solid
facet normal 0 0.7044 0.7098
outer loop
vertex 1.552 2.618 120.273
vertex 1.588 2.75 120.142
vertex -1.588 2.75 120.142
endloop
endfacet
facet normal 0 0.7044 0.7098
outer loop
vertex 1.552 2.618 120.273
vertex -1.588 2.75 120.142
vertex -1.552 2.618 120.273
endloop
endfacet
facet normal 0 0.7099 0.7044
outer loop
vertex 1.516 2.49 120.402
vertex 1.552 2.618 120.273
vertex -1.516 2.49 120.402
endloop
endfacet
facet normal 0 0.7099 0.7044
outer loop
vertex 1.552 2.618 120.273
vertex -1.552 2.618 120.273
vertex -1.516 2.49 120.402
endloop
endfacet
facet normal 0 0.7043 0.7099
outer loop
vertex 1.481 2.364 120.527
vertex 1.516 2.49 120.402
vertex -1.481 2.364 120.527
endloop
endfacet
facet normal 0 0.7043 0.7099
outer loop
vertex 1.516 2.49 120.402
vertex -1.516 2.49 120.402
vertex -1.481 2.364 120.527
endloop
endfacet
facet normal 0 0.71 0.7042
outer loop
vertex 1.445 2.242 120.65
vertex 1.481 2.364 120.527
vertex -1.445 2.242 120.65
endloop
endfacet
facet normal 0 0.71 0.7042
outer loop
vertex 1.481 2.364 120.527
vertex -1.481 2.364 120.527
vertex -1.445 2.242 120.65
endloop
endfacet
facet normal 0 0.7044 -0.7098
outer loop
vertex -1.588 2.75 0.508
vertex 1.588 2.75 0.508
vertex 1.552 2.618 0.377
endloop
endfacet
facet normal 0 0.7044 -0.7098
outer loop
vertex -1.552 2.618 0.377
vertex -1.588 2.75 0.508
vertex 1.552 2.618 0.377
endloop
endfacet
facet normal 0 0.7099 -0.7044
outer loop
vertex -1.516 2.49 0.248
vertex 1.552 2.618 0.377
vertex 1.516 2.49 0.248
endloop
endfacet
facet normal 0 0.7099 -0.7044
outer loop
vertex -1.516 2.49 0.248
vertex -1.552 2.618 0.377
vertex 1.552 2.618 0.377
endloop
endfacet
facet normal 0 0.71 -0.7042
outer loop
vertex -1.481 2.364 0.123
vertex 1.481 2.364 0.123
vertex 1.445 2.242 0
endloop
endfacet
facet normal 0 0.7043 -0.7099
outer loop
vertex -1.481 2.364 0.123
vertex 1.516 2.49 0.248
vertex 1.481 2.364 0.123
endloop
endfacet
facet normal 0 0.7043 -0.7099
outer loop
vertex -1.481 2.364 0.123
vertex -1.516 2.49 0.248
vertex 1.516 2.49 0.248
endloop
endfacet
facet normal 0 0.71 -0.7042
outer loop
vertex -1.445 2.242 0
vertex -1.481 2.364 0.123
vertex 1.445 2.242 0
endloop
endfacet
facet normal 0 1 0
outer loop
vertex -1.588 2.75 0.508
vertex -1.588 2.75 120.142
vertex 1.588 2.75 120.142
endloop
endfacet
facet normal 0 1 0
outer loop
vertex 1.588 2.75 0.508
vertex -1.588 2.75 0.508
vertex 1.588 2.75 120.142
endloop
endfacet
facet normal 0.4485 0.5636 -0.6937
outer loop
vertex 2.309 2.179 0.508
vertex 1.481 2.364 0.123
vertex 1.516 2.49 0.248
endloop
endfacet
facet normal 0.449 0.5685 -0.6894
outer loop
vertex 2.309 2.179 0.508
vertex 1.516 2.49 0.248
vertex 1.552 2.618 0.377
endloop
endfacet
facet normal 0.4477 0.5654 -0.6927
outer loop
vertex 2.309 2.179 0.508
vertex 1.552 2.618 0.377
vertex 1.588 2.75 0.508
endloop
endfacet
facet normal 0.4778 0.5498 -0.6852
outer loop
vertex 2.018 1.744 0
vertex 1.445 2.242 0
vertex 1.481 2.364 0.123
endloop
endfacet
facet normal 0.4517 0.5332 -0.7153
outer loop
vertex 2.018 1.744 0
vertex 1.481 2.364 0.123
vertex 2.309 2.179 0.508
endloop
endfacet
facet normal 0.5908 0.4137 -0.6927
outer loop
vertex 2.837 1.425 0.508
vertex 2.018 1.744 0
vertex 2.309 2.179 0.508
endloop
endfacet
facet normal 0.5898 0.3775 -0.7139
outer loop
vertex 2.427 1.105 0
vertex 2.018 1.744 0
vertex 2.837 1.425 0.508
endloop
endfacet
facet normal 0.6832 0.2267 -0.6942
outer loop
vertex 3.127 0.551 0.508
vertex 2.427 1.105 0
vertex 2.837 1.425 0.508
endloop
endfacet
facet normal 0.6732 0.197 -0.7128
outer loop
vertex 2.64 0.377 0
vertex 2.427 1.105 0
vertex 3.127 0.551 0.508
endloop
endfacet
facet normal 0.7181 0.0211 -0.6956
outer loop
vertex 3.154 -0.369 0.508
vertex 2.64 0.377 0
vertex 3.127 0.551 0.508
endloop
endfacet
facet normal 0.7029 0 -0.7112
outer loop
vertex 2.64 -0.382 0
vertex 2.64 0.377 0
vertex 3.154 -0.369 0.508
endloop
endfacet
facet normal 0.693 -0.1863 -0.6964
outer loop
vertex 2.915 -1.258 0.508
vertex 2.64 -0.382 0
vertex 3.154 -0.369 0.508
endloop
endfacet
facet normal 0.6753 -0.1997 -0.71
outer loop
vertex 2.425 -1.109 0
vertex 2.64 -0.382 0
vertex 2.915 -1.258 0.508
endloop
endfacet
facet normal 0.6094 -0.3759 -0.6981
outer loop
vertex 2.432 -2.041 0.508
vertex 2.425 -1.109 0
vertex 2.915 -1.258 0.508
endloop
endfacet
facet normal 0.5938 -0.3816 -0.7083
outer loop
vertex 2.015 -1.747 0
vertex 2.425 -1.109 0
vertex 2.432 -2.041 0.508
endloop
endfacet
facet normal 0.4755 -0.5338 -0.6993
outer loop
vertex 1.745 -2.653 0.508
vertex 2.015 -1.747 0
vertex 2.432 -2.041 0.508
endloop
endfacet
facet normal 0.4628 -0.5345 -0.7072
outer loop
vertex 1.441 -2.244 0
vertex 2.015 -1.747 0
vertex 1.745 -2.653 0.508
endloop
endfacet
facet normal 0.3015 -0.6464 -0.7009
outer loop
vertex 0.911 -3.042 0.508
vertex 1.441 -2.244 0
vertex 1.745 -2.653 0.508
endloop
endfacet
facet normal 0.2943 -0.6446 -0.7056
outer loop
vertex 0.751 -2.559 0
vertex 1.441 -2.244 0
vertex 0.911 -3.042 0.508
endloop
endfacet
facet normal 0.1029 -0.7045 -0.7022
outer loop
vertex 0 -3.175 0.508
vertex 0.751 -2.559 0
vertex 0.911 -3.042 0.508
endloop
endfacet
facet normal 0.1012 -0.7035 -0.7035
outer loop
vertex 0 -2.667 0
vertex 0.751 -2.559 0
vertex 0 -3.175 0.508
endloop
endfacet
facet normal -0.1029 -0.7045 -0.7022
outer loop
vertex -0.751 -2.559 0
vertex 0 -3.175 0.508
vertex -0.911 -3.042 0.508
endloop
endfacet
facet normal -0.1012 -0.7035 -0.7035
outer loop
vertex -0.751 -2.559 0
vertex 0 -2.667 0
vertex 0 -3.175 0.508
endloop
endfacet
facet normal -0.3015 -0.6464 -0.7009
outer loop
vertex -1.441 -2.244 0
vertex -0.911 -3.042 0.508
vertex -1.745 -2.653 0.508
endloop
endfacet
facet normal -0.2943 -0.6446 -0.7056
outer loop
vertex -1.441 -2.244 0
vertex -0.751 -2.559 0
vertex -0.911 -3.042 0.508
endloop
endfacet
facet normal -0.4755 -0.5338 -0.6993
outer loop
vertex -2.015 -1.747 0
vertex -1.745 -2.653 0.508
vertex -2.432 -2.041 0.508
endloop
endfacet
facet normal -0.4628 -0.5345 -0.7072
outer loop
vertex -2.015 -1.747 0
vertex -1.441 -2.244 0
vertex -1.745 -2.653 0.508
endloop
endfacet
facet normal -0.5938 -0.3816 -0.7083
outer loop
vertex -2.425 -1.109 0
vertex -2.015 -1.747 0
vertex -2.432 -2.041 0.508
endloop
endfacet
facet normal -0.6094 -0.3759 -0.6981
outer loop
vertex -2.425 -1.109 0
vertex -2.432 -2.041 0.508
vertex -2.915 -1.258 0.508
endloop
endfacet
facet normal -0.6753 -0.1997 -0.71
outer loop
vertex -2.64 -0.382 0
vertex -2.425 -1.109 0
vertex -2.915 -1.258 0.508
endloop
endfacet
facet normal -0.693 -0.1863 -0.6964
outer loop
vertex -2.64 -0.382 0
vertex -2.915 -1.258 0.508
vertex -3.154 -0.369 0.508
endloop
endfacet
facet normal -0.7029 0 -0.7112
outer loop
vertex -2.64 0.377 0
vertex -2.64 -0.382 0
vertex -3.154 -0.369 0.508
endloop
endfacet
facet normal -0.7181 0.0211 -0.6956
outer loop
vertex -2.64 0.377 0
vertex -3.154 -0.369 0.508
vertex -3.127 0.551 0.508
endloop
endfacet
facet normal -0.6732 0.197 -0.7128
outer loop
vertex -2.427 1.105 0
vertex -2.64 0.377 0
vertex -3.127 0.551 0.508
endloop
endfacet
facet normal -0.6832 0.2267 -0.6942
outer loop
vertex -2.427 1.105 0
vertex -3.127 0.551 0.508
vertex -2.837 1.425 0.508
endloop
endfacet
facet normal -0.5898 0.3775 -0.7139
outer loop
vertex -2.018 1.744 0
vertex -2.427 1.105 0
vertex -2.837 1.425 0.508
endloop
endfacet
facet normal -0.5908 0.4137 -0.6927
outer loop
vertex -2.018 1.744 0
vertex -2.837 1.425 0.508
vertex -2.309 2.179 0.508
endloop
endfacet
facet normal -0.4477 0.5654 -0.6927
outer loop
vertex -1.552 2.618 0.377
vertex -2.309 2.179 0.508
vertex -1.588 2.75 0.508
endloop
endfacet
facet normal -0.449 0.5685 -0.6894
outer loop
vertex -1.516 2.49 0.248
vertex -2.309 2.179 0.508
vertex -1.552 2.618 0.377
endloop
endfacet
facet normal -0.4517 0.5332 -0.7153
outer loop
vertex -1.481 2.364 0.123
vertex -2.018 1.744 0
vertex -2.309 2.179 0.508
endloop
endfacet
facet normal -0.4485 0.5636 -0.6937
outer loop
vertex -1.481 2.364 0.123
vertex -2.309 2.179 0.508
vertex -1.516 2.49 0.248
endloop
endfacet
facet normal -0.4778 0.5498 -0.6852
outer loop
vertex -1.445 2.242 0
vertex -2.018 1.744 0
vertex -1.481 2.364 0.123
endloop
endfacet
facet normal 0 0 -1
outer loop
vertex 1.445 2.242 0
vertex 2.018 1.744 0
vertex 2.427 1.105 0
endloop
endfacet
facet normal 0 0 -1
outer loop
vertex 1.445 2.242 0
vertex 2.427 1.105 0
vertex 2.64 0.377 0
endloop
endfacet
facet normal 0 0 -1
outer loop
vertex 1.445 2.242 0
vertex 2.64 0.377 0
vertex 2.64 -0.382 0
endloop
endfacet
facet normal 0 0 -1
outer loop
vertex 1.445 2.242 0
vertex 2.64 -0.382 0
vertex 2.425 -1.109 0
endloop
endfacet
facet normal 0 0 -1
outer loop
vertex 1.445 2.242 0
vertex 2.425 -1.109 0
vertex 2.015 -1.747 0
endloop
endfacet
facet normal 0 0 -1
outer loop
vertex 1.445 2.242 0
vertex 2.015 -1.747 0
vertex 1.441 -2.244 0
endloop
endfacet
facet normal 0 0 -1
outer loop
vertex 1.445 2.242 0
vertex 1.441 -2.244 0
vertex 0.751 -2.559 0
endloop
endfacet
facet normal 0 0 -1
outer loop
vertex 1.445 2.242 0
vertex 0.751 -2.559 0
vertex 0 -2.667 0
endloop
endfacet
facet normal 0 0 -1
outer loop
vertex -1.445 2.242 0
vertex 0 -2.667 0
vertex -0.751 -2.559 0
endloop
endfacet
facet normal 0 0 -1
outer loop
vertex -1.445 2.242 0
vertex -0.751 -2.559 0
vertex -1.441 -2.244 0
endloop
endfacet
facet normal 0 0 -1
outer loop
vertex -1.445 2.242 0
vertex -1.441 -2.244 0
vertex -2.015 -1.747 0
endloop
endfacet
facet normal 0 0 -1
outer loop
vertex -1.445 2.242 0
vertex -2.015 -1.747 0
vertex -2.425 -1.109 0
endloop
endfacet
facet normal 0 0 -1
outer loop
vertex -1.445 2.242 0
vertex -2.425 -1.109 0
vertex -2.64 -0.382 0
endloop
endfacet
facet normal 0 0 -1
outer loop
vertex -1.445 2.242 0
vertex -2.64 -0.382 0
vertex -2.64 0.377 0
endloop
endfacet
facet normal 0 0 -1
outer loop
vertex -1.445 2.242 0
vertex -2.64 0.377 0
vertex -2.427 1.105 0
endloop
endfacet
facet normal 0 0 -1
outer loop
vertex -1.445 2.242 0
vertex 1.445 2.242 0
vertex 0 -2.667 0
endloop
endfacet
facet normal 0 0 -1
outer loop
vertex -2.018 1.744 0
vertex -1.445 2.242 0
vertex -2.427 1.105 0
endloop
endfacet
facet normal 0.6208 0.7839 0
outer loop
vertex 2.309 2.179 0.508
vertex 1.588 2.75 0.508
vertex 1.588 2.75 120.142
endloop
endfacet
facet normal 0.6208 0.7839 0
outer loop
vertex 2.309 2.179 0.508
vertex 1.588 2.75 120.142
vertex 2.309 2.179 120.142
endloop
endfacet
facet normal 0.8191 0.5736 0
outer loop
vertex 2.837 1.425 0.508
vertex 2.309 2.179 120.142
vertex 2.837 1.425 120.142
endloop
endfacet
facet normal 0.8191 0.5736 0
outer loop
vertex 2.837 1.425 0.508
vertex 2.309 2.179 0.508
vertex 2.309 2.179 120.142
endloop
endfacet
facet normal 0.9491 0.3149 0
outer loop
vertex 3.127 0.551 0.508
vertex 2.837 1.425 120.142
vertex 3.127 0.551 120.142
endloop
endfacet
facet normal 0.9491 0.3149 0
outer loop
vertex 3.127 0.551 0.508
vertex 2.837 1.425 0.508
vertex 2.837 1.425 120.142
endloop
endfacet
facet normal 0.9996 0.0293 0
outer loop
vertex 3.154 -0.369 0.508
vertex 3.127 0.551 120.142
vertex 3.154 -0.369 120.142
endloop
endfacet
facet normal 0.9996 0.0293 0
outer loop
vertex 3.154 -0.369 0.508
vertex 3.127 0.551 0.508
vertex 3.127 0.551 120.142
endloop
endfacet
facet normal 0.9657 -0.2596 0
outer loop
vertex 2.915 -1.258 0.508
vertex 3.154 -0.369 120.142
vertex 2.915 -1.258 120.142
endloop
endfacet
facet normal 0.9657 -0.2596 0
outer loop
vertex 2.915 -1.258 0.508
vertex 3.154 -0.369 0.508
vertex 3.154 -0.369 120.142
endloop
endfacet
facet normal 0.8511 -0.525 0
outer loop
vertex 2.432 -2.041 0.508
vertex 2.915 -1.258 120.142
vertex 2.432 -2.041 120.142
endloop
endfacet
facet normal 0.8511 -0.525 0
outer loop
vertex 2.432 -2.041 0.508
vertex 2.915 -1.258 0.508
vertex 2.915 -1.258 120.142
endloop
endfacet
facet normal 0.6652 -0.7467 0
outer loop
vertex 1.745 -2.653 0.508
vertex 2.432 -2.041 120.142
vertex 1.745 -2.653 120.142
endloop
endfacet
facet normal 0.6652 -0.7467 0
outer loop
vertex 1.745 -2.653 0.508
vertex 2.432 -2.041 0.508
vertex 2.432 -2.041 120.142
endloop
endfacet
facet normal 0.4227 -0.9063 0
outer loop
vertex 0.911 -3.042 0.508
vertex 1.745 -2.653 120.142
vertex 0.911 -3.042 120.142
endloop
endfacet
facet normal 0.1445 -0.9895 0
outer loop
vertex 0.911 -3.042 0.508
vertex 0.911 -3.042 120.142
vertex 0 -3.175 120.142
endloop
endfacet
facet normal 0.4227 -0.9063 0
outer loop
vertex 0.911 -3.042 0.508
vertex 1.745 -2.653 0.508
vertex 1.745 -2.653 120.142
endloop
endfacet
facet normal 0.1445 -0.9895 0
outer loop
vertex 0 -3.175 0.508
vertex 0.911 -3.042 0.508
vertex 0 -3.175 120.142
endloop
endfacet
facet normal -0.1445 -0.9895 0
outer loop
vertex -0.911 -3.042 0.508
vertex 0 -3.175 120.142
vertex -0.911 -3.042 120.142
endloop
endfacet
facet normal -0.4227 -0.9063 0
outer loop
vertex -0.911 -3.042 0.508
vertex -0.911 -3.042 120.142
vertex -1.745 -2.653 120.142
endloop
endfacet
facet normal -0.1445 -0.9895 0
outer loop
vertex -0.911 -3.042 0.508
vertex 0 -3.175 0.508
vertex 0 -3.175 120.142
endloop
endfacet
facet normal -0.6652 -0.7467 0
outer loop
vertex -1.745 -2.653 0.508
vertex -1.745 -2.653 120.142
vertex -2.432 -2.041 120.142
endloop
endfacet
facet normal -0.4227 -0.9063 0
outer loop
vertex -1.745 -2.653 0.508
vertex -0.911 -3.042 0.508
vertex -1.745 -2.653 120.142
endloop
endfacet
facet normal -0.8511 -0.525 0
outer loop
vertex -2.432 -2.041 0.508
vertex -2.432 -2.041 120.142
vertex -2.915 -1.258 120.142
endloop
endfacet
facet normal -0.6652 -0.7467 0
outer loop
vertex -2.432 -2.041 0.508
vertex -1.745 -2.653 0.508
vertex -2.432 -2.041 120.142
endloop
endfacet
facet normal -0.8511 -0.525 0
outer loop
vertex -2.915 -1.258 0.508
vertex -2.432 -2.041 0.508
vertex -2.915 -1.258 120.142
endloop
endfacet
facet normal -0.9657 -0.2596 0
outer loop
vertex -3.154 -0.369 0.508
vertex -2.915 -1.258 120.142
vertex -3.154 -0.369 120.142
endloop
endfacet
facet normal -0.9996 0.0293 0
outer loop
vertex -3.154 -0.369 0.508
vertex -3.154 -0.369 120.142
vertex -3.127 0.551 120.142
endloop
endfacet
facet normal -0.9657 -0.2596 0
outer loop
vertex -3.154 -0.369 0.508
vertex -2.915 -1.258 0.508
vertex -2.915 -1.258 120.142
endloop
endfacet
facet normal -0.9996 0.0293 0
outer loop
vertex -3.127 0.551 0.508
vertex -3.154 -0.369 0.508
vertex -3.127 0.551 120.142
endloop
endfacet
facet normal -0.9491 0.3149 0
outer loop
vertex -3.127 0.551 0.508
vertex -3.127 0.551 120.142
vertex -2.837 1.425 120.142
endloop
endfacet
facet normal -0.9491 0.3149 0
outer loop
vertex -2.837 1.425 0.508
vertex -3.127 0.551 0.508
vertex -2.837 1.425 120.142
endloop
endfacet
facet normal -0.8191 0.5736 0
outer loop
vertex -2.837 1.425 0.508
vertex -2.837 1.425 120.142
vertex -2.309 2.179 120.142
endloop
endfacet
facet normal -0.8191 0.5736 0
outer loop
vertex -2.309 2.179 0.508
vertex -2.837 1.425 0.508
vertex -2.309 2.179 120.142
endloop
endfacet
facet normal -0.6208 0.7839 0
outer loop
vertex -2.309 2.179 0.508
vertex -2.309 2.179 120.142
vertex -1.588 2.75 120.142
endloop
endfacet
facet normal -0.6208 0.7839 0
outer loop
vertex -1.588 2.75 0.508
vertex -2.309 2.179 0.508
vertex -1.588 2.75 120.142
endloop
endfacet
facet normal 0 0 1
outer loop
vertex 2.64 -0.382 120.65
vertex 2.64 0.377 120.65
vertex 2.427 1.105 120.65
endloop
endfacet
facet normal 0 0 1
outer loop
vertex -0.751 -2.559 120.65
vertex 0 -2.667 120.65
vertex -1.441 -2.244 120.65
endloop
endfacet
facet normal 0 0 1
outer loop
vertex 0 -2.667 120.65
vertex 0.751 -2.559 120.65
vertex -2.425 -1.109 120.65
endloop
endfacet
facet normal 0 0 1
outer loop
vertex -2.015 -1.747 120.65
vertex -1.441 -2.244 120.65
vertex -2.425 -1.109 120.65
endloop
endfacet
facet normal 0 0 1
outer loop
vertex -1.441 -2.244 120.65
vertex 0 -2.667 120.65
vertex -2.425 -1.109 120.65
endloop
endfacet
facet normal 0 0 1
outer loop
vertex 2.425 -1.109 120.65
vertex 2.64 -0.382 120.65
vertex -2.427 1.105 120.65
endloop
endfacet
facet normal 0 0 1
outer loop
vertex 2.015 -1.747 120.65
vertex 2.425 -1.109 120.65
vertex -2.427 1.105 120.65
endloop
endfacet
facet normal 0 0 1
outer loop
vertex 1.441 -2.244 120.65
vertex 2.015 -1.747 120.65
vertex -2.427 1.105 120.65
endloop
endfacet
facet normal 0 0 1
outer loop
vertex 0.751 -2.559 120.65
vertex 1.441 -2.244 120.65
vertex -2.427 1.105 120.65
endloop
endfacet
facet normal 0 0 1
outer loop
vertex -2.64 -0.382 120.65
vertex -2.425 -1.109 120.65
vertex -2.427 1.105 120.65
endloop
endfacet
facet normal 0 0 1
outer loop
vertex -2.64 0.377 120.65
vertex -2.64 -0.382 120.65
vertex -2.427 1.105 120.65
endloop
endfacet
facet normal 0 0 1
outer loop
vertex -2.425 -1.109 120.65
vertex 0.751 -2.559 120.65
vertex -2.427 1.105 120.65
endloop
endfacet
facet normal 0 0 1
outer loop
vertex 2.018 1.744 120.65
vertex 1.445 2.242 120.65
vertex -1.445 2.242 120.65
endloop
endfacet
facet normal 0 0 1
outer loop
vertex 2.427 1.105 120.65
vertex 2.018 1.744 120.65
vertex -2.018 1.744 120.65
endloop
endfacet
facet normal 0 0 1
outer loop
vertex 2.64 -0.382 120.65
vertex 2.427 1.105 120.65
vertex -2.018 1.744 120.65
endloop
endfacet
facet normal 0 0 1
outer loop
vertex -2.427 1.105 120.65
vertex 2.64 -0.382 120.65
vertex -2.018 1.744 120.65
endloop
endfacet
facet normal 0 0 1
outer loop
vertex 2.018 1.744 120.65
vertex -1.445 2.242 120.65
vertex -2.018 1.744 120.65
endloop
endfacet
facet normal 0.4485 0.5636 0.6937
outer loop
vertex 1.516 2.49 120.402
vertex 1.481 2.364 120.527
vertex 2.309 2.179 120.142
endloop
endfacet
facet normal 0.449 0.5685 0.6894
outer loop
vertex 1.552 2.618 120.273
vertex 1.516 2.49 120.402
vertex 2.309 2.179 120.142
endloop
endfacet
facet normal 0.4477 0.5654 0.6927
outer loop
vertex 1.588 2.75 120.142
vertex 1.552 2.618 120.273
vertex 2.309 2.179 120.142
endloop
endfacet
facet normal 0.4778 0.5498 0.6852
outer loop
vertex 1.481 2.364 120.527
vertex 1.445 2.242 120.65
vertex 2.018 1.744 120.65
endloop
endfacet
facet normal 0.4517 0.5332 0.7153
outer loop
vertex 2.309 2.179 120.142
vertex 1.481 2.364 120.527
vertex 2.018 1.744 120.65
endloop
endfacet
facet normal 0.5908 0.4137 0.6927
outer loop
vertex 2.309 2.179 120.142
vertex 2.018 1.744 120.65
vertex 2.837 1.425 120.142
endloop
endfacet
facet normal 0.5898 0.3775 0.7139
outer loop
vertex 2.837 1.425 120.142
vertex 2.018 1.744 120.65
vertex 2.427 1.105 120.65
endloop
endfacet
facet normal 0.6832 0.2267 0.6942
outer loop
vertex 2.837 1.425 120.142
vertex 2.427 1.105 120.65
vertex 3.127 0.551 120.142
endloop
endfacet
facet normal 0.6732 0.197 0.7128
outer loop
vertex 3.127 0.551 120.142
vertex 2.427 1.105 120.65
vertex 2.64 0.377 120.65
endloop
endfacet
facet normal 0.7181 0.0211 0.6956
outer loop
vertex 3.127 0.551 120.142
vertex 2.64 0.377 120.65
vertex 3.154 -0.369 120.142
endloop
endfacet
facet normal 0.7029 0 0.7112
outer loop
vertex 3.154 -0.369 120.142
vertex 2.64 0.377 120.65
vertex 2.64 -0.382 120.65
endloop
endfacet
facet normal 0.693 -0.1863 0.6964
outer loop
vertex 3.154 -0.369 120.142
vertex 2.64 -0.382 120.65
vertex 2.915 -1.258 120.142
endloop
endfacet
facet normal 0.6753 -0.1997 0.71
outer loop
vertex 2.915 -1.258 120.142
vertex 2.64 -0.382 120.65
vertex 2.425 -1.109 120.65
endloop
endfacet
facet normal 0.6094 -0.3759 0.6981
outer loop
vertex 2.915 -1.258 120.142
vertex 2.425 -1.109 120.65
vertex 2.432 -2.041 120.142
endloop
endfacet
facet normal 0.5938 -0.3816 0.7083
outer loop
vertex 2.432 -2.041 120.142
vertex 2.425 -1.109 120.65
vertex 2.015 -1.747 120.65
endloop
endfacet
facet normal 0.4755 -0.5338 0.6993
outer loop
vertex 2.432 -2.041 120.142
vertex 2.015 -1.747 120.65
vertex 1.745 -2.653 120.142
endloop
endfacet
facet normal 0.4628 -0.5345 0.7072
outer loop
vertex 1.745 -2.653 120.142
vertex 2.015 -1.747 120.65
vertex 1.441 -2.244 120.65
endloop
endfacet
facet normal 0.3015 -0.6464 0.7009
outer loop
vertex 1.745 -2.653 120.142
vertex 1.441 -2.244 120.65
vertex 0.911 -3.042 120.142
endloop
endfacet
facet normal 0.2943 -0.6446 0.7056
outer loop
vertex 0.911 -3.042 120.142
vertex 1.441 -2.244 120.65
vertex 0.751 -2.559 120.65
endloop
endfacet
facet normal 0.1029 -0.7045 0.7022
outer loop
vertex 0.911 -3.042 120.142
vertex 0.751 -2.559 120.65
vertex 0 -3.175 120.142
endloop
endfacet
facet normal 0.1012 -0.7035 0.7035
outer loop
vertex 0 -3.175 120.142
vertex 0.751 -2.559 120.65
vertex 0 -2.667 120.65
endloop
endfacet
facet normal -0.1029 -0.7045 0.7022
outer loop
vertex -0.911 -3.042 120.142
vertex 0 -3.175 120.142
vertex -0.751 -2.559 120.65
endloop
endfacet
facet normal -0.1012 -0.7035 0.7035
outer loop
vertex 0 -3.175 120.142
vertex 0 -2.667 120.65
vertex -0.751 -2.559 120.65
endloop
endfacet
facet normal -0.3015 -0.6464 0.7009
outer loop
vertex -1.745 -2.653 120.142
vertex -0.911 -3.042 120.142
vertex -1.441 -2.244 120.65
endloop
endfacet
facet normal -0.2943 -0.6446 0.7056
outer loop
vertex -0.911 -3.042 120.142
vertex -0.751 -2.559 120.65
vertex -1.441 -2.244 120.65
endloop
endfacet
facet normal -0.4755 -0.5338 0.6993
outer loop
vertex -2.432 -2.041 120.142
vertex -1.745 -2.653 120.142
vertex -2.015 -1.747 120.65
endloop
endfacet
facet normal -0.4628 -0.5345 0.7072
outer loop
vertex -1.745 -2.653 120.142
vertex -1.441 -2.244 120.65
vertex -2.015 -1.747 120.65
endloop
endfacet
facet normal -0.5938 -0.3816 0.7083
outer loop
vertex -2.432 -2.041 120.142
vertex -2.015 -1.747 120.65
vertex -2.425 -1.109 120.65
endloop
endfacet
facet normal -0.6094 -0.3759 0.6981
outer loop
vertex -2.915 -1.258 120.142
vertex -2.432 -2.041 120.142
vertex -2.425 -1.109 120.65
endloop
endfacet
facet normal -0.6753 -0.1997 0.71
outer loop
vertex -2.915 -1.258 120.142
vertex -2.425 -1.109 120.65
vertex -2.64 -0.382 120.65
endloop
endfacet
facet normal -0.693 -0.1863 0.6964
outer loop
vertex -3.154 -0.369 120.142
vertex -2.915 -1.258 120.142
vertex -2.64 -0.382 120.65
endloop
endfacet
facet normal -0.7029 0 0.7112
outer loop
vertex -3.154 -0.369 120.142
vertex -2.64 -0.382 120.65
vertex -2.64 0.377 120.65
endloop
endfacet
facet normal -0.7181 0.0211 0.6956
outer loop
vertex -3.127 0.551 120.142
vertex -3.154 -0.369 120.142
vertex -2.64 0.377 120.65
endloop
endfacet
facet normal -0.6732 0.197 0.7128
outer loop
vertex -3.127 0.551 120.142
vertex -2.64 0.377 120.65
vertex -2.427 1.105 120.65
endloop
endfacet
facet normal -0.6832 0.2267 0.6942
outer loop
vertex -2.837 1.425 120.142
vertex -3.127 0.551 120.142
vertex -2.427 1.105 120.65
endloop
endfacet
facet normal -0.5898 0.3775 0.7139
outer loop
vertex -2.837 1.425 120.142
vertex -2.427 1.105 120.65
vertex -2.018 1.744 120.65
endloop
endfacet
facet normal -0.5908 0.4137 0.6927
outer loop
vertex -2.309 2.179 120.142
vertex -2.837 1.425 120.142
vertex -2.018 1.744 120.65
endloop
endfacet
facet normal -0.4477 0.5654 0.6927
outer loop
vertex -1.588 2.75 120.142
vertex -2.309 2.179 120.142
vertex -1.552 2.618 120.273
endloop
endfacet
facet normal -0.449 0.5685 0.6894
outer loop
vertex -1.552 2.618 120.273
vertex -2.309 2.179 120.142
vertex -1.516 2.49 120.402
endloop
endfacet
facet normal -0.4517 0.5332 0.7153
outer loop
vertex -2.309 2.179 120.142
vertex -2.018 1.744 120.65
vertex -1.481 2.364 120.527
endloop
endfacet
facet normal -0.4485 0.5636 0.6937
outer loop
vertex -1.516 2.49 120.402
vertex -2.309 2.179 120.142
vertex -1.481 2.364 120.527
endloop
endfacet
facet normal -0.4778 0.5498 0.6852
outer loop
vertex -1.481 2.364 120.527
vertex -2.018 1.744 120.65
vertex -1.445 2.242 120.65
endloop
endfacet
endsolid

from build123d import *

# Parameters (mm, degrees)
BOSS_EXTRUDE1_DEPTH = 120.65
CHAMFER1_SIZE       = 0.508


with BuildPart() as part:
    # Sketch1 → Boss-Extrude1 (new body)
    with BuildSketch(Plane.XY):
        with BuildLine():
            Line((-1.5875, 2.749630657), (1.5875, 2.749630657))
            ThreePointArc((1.5875, 2.749630657), (0, -3.175), (-1.5875, 2.749630657))
        make_face()
    extrude(amount=BOSS_EXTRUDE1_DEPTH)

    # Chamfer1
    # the kernel refuses this chamfer: 0.508 mm, written as the material it takes off along each edge
    with BuildSketch(Plane(origin=(-2.893914958, 2.749630657, 0), x_dir=(0, 0.027495876610586435, 0.9996219169112968), z_dir=(1, 0, 0))) as chamfer1_piece_1:
        Polygon((CHAMFER1_SIZE * 0.999621916911, CHAMFER1_SIZE * 0.0274958766106), (-CHAMFER1_SIZE * 0.0274958766106, CHAMFER1_SIZE * 0.999621916911), (0, 0), align=None)
    extrude(amount=5.787829916, mode=Mode.SUBTRACT)
    with BuildSketch(Plane(origin=(0, 0, 0), x_dir=(0.11006425826792274, 0.9939244735149306, 0), z_dir=(-0.9939244735149306, 0.11006425826792274, 0))) as chamfer1_piece_2:
        Polygon((3.175, -CHAMFER1_SIZE), (3.175 - CHAMFER1_SIZE, 0), (3.175, 0), align=None)
    revolve(axis=Axis((0, 0, 0), (0, 0, -1)), revolution_arc=347.361960422, mode=Mode.SUBTRACT)
    with BuildSketch(Plane(origin=(0, 0, 120.65), x_dir=(0.11006425826792288, 0.9939244735149306, 0), z_dir=(-0.9939244735149306, 0.11006425826792288, 0))) as chamfer1_piece_3:
        Polygon((3.175, CHAMFER1_SIZE), (3.175 - CHAMFER1_SIZE, 0), (3.175, 0), align=None)
    revolve(axis=Axis((0, 0, 120.65), (0, 0, -1)), revolution_arc=347.361960422, mode=Mode.SUBTRACT)
    with BuildSketch(Plane(origin=(-2.893914958, 2.749630657, 120.65), x_dir=(0, 0.027495876610587017, -0.9996219169112968), z_dir=(1, 0, 0))) as chamfer1_piece_4:
        Polygon((CHAMFER1_SIZE * 0.999621916911, -CHAMFER1_SIZE * 0.0274958766106), (-CHAMFER1_SIZE * 0.0274958766106, -CHAMFER1_SIZE * 0.999621916911), (0, 0), align=None)
    extrude(amount=5.787829916, mode=Mode.SUBTRACT)


solid = part.part
